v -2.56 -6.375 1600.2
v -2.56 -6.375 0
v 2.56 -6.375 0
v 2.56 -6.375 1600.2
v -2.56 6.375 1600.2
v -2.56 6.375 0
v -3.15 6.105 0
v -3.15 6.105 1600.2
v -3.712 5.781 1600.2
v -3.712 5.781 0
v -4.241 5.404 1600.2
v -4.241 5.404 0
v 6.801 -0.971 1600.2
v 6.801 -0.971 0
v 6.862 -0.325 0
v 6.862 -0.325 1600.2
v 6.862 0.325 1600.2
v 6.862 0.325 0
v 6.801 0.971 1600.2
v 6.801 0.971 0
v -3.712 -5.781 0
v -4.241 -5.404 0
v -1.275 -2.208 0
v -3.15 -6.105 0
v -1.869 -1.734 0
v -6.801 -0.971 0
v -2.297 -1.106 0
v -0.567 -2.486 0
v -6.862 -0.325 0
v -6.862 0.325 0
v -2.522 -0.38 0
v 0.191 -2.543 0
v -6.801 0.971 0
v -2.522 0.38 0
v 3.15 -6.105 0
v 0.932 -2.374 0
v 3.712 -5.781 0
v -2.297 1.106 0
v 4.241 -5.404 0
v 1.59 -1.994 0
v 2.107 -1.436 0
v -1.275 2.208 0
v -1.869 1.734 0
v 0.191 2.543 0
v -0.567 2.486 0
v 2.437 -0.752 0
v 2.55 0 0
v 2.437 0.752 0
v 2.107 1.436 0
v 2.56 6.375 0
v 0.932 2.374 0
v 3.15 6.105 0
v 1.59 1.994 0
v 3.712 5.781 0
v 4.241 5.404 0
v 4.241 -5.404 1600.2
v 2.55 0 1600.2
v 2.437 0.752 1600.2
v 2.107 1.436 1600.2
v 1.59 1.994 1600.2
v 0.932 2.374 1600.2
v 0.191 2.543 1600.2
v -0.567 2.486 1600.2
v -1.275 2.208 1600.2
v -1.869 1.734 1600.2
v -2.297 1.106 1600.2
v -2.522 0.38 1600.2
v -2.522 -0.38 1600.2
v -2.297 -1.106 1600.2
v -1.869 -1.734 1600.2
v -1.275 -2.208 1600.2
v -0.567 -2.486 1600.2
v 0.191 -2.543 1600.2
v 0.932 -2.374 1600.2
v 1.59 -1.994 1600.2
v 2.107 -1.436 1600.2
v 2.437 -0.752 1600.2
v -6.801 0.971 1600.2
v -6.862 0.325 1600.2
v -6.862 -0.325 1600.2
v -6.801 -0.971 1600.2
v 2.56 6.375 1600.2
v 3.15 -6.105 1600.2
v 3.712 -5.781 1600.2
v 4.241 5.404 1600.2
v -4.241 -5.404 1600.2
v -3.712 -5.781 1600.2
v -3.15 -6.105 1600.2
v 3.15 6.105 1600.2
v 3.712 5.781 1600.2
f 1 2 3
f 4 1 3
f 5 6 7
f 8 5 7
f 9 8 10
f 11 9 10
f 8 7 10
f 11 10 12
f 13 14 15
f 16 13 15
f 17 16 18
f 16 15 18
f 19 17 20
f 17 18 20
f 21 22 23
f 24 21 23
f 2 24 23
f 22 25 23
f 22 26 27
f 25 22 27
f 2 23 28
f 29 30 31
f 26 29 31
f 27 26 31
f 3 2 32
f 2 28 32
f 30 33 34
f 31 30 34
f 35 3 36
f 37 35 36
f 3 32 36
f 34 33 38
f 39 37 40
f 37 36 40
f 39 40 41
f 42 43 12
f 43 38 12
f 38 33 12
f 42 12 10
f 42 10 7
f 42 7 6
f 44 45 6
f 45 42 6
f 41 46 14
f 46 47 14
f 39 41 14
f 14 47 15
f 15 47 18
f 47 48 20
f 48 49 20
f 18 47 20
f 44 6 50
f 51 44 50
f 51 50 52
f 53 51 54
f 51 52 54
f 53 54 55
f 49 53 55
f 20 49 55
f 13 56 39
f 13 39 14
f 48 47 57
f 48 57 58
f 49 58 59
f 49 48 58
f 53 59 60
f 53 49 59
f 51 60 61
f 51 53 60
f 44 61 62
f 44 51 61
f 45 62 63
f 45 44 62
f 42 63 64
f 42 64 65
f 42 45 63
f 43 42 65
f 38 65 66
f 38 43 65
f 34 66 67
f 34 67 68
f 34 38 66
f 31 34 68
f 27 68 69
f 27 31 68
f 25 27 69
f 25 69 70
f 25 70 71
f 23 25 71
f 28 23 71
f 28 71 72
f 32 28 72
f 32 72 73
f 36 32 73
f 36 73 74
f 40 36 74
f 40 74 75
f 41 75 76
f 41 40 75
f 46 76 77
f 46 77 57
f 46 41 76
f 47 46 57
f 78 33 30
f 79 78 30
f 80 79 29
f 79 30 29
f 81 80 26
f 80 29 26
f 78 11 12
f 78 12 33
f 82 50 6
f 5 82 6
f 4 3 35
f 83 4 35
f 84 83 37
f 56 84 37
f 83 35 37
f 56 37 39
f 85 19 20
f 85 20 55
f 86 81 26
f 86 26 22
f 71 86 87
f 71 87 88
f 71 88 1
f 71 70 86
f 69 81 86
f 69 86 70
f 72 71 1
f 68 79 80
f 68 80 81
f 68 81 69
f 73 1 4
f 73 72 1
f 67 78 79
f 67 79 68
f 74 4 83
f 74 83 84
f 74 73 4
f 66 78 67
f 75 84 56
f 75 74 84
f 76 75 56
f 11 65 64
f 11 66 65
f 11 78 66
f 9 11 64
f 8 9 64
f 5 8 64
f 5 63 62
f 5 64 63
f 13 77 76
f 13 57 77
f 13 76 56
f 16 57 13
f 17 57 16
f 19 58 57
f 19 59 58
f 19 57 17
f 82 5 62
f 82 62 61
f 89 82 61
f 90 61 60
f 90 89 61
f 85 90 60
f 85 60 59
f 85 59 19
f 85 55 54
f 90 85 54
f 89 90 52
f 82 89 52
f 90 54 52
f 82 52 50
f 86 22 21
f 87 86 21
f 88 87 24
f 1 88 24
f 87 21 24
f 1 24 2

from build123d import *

# Parameters (mm, degrees)
F0_R     = 2.55
F1_DEPTH = 1600.2


with BuildPart() as f1:
    # F0 (on Top) → F1 (new body)
    with BuildSketch(Plane.XY):
        with BuildLine():
            ThreePointArc((4.241495, 5.404315), (3.435, 5.949595), (2.559526, 6.3754))
            Line((2.559526, 6.3754), (-2.559526, 6.3754))
            ThreePointArc((-2.559526, 6.3754), (-3.435, 5.949595), (-4.241495, 5.404315))
            Line((-4.241495, 5.404315), (-6.801022, 0.971085))
            ThreePointArc((-6.801022, 0.971085), (-6.87, 0), (-6.801022, -0.971085))
            Line((-6.801022, -0.971085), (-4.241495, -5.404315))
            ThreePointArc((-4.241495, -5.404315), (-3.435, -5.949595), (-2.559526, -6.3754))
            Line((-2.559526, -6.3754), (2.559526, -6.3754))
            ThreePointArc((2.559526, -6.3754), (3.435, -5.949595), (4.241495, -5.404315))
            Line((4.241495, -5.404315), (6.801022, -0.971085))
            ThreePointArc((6.801022, -0.971085), (6.87, 0), (6.801022, 0.971085))
            Line((6.801022, 0.971085), (4.241495, 5.404315))
        make_face()
        Circle(F0_R, mode=Mode.SUBTRACT)
    extrude(amount=F1_DEPTH)


solid = f1.part
